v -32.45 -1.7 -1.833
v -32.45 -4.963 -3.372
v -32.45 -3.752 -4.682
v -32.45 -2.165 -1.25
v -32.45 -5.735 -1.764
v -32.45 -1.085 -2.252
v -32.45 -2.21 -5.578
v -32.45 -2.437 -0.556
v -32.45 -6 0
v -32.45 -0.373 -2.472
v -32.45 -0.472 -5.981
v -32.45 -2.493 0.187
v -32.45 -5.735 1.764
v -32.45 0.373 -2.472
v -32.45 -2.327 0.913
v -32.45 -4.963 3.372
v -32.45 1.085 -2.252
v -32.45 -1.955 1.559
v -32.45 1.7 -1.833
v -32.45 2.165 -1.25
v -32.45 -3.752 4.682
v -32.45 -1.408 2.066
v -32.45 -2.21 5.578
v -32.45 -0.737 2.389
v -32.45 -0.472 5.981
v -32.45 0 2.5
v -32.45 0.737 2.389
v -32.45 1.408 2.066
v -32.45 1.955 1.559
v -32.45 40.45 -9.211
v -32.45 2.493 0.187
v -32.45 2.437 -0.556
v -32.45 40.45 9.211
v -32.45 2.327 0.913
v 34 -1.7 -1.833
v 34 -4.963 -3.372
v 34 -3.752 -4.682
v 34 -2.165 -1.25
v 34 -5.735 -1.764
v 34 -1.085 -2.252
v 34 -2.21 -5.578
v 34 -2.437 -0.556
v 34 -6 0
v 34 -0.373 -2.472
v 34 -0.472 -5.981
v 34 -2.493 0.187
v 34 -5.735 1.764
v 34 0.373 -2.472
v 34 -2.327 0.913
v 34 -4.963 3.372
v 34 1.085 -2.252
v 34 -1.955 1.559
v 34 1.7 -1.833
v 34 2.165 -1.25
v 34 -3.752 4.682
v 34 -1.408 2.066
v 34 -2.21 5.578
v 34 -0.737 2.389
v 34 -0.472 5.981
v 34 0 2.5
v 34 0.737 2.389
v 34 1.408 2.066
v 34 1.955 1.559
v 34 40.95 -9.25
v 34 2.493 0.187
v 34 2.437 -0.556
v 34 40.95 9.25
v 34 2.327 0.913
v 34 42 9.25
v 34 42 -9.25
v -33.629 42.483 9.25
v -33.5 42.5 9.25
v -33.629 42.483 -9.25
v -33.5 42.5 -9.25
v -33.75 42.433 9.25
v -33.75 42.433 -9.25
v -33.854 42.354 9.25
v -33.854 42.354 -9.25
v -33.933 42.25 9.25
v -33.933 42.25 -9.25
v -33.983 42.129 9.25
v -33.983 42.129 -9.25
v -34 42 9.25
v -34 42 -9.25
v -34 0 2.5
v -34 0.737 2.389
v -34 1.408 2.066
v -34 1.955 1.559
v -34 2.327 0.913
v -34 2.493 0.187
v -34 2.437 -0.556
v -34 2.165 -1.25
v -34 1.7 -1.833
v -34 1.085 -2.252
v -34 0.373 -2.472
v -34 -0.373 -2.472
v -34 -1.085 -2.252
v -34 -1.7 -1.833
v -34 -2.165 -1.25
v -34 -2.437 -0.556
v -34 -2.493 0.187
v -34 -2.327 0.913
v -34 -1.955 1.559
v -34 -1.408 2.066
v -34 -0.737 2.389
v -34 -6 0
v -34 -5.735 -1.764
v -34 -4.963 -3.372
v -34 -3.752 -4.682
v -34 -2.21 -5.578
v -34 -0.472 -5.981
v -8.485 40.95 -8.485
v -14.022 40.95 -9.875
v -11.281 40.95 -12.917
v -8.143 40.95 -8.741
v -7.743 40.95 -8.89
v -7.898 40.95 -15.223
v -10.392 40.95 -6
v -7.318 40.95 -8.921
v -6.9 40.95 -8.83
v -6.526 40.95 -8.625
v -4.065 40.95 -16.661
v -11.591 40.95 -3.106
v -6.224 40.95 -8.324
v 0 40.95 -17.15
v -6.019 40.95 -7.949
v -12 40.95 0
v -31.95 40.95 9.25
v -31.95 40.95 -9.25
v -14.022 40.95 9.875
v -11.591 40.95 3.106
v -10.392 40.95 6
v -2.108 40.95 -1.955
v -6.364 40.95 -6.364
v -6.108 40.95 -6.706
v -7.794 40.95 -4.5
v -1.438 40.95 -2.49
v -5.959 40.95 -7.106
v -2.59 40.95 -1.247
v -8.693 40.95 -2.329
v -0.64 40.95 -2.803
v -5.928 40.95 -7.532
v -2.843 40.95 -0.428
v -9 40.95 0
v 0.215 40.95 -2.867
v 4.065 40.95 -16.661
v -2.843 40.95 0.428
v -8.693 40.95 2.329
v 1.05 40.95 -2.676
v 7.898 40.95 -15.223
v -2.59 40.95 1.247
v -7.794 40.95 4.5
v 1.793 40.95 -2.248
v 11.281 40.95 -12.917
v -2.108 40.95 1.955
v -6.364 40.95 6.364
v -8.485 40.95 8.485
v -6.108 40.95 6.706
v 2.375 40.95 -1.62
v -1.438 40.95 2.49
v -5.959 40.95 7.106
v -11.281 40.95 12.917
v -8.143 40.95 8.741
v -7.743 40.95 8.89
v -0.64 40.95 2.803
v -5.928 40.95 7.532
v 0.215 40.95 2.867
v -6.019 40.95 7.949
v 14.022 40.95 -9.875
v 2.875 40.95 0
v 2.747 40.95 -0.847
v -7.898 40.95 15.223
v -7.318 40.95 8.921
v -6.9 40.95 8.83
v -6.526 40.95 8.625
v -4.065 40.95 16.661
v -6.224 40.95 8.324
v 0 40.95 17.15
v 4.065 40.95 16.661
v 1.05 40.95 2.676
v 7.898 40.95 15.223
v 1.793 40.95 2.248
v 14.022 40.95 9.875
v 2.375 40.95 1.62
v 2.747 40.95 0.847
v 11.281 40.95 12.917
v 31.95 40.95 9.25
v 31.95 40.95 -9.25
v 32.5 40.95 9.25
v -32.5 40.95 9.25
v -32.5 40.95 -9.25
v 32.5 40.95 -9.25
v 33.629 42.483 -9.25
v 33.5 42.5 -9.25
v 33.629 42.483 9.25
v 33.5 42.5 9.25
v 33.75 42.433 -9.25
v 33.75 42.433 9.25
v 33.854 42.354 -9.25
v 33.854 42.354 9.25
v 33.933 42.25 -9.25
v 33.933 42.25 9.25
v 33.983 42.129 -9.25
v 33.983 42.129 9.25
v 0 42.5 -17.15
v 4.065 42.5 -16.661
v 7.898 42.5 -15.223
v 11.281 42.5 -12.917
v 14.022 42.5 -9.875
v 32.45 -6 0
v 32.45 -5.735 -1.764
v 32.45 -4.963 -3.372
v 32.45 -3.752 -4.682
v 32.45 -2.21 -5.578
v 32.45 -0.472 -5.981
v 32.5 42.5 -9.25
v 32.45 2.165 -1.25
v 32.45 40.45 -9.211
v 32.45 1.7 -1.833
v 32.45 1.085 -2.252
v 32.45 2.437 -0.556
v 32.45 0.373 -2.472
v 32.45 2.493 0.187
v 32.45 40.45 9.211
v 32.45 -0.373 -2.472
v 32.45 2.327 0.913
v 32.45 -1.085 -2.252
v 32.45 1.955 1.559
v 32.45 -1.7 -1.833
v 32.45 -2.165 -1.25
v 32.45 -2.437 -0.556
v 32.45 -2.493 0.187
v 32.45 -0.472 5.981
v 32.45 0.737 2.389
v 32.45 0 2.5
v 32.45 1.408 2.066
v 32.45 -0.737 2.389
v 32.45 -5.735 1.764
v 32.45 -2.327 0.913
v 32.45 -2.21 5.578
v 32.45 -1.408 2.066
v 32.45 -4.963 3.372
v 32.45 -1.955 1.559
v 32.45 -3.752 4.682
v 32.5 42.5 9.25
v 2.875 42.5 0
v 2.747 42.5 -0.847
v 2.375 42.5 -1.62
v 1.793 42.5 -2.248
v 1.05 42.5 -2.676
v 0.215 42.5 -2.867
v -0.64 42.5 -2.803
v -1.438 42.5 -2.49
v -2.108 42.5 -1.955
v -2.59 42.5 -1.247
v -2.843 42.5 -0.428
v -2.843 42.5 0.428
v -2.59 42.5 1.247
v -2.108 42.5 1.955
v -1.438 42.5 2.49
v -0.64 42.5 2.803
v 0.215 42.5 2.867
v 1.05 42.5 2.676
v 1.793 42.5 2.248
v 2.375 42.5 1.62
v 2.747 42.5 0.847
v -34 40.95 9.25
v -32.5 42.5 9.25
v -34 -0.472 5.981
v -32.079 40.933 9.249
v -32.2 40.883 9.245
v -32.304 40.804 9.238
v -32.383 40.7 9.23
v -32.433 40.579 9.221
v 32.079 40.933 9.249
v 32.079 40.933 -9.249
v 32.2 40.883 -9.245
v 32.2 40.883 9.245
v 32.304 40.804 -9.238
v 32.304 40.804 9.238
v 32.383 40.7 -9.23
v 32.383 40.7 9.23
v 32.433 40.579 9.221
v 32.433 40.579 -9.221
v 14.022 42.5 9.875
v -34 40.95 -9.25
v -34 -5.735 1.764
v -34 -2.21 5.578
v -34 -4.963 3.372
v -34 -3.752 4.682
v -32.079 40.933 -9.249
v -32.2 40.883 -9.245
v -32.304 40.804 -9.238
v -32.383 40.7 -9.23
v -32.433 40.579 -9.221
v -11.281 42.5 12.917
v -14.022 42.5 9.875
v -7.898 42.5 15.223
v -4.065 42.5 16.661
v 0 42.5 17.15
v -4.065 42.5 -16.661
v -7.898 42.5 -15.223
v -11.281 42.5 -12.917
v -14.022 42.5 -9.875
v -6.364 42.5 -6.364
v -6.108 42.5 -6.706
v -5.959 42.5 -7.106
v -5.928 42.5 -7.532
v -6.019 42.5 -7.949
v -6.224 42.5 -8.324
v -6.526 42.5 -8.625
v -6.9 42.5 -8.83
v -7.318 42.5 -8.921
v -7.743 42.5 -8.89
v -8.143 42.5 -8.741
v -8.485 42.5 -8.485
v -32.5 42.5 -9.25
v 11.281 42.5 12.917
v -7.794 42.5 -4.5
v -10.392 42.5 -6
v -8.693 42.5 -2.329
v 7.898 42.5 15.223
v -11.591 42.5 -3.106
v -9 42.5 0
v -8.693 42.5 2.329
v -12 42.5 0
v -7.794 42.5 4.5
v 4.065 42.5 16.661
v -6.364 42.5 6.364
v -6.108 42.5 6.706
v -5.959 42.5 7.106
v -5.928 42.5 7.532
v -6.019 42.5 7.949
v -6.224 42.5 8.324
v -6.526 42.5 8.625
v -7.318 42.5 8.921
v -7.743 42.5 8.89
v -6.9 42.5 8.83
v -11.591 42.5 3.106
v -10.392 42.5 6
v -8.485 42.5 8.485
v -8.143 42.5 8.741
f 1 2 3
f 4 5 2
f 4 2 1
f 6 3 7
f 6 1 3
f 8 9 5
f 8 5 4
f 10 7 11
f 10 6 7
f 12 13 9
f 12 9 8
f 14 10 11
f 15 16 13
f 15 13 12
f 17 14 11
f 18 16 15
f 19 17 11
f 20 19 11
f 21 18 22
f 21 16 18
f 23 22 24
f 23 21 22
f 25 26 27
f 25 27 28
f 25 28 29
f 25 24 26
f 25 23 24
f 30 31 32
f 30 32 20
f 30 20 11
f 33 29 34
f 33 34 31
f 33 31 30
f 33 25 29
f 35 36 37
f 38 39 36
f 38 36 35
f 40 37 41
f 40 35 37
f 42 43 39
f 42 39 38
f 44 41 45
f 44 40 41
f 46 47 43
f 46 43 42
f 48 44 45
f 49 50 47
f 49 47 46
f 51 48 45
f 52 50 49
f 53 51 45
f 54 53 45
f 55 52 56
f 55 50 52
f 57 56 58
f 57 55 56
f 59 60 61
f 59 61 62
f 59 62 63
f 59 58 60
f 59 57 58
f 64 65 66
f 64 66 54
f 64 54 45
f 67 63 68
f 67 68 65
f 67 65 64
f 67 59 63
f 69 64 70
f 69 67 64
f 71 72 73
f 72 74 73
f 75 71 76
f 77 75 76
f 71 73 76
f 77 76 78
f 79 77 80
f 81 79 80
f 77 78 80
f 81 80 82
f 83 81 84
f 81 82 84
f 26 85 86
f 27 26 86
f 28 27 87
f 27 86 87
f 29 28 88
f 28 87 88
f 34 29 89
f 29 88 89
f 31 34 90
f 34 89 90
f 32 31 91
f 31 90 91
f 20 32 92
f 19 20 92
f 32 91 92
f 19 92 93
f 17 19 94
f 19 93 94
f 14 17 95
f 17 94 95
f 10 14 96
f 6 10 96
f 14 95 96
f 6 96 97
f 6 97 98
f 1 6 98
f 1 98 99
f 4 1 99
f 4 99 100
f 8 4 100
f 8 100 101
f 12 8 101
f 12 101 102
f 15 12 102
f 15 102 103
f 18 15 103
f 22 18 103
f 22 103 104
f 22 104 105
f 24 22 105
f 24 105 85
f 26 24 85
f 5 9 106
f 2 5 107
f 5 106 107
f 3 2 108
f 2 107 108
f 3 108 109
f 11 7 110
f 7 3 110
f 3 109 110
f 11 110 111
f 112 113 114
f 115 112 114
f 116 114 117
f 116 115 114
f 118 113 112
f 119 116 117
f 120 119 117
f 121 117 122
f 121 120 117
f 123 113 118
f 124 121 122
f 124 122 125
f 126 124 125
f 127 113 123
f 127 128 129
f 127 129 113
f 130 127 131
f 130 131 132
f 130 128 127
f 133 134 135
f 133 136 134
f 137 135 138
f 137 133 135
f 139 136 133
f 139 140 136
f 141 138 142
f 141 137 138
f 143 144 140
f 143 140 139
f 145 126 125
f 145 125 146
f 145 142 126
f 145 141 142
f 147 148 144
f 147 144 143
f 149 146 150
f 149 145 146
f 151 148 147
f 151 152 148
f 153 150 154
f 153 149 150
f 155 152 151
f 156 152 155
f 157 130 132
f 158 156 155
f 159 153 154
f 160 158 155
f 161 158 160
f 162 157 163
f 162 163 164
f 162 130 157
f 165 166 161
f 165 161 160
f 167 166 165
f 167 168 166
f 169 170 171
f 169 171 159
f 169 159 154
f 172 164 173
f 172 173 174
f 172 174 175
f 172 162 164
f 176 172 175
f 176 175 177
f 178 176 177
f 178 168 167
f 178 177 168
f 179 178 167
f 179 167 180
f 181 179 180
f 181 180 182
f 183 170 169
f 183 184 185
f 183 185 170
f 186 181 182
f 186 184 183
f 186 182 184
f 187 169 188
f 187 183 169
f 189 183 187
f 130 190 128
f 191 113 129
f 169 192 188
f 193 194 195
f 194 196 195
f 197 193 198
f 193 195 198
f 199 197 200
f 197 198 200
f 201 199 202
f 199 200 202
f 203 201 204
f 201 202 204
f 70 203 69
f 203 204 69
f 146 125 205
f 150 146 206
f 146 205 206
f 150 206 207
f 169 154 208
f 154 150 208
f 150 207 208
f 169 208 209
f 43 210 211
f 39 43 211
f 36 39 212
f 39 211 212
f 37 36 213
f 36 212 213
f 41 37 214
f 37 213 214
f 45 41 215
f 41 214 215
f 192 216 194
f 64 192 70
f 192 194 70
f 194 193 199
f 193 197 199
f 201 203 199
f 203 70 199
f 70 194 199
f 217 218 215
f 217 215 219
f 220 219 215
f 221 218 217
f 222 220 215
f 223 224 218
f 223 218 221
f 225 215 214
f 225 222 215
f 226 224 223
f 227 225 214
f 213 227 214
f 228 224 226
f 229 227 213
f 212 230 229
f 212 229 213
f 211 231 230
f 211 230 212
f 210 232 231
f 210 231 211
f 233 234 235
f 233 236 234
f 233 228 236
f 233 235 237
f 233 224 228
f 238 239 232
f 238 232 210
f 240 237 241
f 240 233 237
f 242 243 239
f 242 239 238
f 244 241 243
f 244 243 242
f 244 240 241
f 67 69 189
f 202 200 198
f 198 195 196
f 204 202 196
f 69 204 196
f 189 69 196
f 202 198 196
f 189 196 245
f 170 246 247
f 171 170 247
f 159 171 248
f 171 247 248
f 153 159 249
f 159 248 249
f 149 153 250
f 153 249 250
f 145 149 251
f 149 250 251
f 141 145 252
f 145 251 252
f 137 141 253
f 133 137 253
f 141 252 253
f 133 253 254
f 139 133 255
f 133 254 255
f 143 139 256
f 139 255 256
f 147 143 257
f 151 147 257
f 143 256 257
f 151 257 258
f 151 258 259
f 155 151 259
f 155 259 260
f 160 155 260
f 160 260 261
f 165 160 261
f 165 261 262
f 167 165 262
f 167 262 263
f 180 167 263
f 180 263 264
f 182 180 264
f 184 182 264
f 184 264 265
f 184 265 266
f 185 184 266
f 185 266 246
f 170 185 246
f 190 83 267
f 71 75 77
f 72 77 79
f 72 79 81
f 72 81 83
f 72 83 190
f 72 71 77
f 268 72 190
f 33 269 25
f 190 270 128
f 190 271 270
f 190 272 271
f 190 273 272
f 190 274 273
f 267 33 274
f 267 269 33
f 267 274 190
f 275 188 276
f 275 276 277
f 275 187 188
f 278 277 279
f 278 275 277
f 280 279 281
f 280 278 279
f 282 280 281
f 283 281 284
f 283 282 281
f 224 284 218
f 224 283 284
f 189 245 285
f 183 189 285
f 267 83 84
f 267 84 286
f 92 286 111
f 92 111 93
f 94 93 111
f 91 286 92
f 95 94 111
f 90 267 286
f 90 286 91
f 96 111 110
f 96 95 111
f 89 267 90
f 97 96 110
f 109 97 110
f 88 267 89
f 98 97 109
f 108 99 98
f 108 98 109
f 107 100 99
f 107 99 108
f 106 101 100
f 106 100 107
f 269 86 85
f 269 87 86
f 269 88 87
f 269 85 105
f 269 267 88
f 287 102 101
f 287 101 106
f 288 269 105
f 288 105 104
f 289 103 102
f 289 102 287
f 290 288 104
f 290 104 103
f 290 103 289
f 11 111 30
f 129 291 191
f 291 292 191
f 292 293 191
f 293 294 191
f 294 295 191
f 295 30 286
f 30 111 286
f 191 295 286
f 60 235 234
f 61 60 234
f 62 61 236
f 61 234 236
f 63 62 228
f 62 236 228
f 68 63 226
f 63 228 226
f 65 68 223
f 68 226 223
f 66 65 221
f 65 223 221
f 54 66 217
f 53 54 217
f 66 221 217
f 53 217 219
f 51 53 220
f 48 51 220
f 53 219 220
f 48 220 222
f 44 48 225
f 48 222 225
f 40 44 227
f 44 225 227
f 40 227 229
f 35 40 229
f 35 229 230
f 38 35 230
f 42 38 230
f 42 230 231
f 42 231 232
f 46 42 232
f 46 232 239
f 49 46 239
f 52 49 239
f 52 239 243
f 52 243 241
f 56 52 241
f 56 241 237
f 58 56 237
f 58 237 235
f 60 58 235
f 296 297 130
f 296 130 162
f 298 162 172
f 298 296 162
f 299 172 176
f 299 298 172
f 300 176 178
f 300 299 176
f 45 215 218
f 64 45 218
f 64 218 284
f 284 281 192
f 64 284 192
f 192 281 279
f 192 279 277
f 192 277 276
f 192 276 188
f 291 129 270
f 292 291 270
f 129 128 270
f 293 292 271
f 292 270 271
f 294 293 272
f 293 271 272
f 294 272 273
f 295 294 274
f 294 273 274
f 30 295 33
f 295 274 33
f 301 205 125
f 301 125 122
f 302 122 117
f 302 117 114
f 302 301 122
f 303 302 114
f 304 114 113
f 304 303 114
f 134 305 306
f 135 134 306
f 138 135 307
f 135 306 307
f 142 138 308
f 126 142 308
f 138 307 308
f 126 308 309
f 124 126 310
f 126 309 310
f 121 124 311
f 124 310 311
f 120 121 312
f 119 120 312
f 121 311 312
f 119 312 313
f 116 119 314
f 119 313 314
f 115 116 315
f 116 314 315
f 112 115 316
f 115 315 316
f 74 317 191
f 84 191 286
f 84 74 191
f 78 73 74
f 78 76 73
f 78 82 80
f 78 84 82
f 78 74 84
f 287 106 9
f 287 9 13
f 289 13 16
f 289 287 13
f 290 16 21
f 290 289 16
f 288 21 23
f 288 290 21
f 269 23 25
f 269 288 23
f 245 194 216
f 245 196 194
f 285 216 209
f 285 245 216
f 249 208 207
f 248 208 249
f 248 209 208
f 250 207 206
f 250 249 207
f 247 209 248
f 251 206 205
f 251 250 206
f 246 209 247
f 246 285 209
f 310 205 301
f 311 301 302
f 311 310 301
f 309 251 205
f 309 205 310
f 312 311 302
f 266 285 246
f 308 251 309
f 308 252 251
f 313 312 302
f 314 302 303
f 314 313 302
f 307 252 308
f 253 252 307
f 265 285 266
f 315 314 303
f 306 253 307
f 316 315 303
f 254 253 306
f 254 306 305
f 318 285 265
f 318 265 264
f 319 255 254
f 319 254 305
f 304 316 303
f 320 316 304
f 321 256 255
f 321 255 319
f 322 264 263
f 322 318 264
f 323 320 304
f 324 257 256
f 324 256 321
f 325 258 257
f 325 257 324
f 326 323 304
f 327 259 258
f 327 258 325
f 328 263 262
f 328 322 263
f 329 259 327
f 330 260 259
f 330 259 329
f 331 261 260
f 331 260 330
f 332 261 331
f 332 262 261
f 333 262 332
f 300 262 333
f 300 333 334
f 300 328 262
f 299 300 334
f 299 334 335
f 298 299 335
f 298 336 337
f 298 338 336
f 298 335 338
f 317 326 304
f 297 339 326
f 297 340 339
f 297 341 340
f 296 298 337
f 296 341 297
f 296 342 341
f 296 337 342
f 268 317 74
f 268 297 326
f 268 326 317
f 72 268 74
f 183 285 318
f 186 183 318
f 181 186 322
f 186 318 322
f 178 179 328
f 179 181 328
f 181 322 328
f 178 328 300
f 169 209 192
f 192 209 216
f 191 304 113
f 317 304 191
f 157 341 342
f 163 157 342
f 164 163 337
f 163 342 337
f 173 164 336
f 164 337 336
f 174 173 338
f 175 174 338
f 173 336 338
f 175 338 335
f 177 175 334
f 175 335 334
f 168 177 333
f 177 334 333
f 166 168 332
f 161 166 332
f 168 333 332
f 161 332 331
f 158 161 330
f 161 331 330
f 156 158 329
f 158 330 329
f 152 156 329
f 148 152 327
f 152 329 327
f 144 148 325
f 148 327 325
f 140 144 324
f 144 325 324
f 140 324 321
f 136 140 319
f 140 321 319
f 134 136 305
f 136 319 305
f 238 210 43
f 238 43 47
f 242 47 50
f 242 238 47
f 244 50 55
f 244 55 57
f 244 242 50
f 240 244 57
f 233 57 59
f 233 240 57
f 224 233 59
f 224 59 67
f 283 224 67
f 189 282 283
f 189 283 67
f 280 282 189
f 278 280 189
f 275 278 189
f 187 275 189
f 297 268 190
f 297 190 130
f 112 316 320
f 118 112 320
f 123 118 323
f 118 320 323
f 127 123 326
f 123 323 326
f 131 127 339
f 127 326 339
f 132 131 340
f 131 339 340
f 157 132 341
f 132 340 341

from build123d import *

# Parameters (mm, degrees)
BOSS_EXTRUDE1_DEPTH = 17.15
CUT_EXTRUDE1_DEPTH  = 69
CUT_EXTRUDE2_DEPTH  = 49.5
SKETCH4_R           = 2.875
CUT_EXTRUDE3_DEPTH  = 34.3
SKETCH5_R           = 2.5
CUT_EXTRUDE4_DEPTH  = 69
FILLET2_R           = 0.5


with BuildPart() as part:
    # Sketch1 → Boss-Extrude1 (new body, symmetric)
    with BuildSketch(Plane.XY):
        Polygon((-32.45, -6), (-32.45, 40.95), (32.45, 40.95), (32.45, -6), (34, -6), (34, 42.5), (-34, 42.5), (-34, -6), align=None)
    extrude(amount=BOSS_EXTRUDE1_DEPTH, both=True)

    # Sketch2 → Cut-Extrude1 (cut, through all)
    with BuildSketch(Plane.ZY.offset(34)):
        with BuildLine():
            Line((-5.981406604, -0.471990503), (-9.25, 40.95))
            Line((-9.25, 40.95), (-17.15, 40.95))
            Line((-17.15, 40.95), (-17.15, -6))
            Line((-17.15, -6), (0, -6))
            ThreePointArc((0, -6), (-4.07234926, -4.406355808), (-5.981406604, -0.471990503))
        make_face()
    cut_extrude1 = extrude(amount=-CUT_EXTRUDE1_DEPTH, mode=Mode.SUBTRACT)

    # Mirror1: Cut-Extrude1 across plane
    add(cut_extrude1.mirror(Plane.XY), mode=Mode.SUBTRACT)

    # Sketch3 → Cut-Extrude2 (cut, through all)
    with BuildSketch(Plane(origin=(0, 42.5, 0), x_dir=(1, 0, 0), z_dir=(0, 1, 0))):
        with BuildLine():
            Line((-32.5, -9.25), (-14.021657356, -9.875))
            ThreePointArc((-14.021657356, -9.875), (-7.898298867, -15.222988373), (0, -17.15))
            Line((0, -17.15), (-34, -17.15))
            Line((-34, -17.15), (-34, -9.25))
            Line((-34, -9.25), (-32.5, -9.25))
        make_face()
        with BuildLine():
            Line((-34, 9.25), (-34, 17.15))
            Line((-34, 17.15), (0, 17.15))
            ThreePointArc((0, 17.15), (-7.898298867, 15.222988373), (-14.021657356, 9.875))
            Line((-14.021657356, 9.875), (-32.5, 9.25))
            Line((-32.5, 9.25), (-34, 9.25))
        make_face()
    cut_extrude2 = extrude(amount=-CUT_EXTRUDE2_DEPTH, mode=Mode.SUBTRACT)

    # Mirror2: Cut-Extrude2 across plane
    add(cut_extrude2.mirror(Plane(origin=(0, 0, 0), x_dir=(0, 0, 1), z_dir=(1, 0, 0))), mode=Mode.SUBTRACT)

    # Sketch4 → Cut-Extrude3 (cut)
    with BuildSketch(Plane(origin=(0, 42.5, 0), x_dir=(1, 0, 0), z_dir=(0, 1, 0))):
        Circle(SKETCH4_R)
        with BuildLine():
            ThreePointArc((-8.485281374, 8.485281374), (-12, 0), (-8.485281374, -8.485281374))
            ThreePointArc((-8.485281374, -8.485281374), (-6.363961031, -8.485281374), (-6.363961031, -6.363961031))
            ThreePointArc((-6.363961031, -6.363961031), (-9, 0), (-6.363961031, 6.363961031))
            ThreePointArc((-6.363961031, 6.363961031), (-6.363961031, 8.485281374), (-8.485281374, 8.485281374))
        make_face()
    extrude(amount=-CUT_EXTRUDE3_DEPTH, mode=Mode.SUBTRACT)

    # Sketch5 → Cut-Extrude4 (cut, through all)
    with BuildSketch(Plane.ZY.offset(34)):
        Circle(SKETCH5_R)
    extrude(amount=-CUT_EXTRUDE4_DEPTH, mode=Mode.SUBTRACT)

    # Fillet2
    fillet2_edges = [part.edges().sort_by_distance(p)[0] for p in [
        (34, 42.5, 0),
        (32.45, 40.95, 0),
        (-32.45, 40.95, 0),
        (-34, 42.5, 0),
    ]]
    fillet(fillet2_edges, radius=FILLET2_R)


solid = part.part
